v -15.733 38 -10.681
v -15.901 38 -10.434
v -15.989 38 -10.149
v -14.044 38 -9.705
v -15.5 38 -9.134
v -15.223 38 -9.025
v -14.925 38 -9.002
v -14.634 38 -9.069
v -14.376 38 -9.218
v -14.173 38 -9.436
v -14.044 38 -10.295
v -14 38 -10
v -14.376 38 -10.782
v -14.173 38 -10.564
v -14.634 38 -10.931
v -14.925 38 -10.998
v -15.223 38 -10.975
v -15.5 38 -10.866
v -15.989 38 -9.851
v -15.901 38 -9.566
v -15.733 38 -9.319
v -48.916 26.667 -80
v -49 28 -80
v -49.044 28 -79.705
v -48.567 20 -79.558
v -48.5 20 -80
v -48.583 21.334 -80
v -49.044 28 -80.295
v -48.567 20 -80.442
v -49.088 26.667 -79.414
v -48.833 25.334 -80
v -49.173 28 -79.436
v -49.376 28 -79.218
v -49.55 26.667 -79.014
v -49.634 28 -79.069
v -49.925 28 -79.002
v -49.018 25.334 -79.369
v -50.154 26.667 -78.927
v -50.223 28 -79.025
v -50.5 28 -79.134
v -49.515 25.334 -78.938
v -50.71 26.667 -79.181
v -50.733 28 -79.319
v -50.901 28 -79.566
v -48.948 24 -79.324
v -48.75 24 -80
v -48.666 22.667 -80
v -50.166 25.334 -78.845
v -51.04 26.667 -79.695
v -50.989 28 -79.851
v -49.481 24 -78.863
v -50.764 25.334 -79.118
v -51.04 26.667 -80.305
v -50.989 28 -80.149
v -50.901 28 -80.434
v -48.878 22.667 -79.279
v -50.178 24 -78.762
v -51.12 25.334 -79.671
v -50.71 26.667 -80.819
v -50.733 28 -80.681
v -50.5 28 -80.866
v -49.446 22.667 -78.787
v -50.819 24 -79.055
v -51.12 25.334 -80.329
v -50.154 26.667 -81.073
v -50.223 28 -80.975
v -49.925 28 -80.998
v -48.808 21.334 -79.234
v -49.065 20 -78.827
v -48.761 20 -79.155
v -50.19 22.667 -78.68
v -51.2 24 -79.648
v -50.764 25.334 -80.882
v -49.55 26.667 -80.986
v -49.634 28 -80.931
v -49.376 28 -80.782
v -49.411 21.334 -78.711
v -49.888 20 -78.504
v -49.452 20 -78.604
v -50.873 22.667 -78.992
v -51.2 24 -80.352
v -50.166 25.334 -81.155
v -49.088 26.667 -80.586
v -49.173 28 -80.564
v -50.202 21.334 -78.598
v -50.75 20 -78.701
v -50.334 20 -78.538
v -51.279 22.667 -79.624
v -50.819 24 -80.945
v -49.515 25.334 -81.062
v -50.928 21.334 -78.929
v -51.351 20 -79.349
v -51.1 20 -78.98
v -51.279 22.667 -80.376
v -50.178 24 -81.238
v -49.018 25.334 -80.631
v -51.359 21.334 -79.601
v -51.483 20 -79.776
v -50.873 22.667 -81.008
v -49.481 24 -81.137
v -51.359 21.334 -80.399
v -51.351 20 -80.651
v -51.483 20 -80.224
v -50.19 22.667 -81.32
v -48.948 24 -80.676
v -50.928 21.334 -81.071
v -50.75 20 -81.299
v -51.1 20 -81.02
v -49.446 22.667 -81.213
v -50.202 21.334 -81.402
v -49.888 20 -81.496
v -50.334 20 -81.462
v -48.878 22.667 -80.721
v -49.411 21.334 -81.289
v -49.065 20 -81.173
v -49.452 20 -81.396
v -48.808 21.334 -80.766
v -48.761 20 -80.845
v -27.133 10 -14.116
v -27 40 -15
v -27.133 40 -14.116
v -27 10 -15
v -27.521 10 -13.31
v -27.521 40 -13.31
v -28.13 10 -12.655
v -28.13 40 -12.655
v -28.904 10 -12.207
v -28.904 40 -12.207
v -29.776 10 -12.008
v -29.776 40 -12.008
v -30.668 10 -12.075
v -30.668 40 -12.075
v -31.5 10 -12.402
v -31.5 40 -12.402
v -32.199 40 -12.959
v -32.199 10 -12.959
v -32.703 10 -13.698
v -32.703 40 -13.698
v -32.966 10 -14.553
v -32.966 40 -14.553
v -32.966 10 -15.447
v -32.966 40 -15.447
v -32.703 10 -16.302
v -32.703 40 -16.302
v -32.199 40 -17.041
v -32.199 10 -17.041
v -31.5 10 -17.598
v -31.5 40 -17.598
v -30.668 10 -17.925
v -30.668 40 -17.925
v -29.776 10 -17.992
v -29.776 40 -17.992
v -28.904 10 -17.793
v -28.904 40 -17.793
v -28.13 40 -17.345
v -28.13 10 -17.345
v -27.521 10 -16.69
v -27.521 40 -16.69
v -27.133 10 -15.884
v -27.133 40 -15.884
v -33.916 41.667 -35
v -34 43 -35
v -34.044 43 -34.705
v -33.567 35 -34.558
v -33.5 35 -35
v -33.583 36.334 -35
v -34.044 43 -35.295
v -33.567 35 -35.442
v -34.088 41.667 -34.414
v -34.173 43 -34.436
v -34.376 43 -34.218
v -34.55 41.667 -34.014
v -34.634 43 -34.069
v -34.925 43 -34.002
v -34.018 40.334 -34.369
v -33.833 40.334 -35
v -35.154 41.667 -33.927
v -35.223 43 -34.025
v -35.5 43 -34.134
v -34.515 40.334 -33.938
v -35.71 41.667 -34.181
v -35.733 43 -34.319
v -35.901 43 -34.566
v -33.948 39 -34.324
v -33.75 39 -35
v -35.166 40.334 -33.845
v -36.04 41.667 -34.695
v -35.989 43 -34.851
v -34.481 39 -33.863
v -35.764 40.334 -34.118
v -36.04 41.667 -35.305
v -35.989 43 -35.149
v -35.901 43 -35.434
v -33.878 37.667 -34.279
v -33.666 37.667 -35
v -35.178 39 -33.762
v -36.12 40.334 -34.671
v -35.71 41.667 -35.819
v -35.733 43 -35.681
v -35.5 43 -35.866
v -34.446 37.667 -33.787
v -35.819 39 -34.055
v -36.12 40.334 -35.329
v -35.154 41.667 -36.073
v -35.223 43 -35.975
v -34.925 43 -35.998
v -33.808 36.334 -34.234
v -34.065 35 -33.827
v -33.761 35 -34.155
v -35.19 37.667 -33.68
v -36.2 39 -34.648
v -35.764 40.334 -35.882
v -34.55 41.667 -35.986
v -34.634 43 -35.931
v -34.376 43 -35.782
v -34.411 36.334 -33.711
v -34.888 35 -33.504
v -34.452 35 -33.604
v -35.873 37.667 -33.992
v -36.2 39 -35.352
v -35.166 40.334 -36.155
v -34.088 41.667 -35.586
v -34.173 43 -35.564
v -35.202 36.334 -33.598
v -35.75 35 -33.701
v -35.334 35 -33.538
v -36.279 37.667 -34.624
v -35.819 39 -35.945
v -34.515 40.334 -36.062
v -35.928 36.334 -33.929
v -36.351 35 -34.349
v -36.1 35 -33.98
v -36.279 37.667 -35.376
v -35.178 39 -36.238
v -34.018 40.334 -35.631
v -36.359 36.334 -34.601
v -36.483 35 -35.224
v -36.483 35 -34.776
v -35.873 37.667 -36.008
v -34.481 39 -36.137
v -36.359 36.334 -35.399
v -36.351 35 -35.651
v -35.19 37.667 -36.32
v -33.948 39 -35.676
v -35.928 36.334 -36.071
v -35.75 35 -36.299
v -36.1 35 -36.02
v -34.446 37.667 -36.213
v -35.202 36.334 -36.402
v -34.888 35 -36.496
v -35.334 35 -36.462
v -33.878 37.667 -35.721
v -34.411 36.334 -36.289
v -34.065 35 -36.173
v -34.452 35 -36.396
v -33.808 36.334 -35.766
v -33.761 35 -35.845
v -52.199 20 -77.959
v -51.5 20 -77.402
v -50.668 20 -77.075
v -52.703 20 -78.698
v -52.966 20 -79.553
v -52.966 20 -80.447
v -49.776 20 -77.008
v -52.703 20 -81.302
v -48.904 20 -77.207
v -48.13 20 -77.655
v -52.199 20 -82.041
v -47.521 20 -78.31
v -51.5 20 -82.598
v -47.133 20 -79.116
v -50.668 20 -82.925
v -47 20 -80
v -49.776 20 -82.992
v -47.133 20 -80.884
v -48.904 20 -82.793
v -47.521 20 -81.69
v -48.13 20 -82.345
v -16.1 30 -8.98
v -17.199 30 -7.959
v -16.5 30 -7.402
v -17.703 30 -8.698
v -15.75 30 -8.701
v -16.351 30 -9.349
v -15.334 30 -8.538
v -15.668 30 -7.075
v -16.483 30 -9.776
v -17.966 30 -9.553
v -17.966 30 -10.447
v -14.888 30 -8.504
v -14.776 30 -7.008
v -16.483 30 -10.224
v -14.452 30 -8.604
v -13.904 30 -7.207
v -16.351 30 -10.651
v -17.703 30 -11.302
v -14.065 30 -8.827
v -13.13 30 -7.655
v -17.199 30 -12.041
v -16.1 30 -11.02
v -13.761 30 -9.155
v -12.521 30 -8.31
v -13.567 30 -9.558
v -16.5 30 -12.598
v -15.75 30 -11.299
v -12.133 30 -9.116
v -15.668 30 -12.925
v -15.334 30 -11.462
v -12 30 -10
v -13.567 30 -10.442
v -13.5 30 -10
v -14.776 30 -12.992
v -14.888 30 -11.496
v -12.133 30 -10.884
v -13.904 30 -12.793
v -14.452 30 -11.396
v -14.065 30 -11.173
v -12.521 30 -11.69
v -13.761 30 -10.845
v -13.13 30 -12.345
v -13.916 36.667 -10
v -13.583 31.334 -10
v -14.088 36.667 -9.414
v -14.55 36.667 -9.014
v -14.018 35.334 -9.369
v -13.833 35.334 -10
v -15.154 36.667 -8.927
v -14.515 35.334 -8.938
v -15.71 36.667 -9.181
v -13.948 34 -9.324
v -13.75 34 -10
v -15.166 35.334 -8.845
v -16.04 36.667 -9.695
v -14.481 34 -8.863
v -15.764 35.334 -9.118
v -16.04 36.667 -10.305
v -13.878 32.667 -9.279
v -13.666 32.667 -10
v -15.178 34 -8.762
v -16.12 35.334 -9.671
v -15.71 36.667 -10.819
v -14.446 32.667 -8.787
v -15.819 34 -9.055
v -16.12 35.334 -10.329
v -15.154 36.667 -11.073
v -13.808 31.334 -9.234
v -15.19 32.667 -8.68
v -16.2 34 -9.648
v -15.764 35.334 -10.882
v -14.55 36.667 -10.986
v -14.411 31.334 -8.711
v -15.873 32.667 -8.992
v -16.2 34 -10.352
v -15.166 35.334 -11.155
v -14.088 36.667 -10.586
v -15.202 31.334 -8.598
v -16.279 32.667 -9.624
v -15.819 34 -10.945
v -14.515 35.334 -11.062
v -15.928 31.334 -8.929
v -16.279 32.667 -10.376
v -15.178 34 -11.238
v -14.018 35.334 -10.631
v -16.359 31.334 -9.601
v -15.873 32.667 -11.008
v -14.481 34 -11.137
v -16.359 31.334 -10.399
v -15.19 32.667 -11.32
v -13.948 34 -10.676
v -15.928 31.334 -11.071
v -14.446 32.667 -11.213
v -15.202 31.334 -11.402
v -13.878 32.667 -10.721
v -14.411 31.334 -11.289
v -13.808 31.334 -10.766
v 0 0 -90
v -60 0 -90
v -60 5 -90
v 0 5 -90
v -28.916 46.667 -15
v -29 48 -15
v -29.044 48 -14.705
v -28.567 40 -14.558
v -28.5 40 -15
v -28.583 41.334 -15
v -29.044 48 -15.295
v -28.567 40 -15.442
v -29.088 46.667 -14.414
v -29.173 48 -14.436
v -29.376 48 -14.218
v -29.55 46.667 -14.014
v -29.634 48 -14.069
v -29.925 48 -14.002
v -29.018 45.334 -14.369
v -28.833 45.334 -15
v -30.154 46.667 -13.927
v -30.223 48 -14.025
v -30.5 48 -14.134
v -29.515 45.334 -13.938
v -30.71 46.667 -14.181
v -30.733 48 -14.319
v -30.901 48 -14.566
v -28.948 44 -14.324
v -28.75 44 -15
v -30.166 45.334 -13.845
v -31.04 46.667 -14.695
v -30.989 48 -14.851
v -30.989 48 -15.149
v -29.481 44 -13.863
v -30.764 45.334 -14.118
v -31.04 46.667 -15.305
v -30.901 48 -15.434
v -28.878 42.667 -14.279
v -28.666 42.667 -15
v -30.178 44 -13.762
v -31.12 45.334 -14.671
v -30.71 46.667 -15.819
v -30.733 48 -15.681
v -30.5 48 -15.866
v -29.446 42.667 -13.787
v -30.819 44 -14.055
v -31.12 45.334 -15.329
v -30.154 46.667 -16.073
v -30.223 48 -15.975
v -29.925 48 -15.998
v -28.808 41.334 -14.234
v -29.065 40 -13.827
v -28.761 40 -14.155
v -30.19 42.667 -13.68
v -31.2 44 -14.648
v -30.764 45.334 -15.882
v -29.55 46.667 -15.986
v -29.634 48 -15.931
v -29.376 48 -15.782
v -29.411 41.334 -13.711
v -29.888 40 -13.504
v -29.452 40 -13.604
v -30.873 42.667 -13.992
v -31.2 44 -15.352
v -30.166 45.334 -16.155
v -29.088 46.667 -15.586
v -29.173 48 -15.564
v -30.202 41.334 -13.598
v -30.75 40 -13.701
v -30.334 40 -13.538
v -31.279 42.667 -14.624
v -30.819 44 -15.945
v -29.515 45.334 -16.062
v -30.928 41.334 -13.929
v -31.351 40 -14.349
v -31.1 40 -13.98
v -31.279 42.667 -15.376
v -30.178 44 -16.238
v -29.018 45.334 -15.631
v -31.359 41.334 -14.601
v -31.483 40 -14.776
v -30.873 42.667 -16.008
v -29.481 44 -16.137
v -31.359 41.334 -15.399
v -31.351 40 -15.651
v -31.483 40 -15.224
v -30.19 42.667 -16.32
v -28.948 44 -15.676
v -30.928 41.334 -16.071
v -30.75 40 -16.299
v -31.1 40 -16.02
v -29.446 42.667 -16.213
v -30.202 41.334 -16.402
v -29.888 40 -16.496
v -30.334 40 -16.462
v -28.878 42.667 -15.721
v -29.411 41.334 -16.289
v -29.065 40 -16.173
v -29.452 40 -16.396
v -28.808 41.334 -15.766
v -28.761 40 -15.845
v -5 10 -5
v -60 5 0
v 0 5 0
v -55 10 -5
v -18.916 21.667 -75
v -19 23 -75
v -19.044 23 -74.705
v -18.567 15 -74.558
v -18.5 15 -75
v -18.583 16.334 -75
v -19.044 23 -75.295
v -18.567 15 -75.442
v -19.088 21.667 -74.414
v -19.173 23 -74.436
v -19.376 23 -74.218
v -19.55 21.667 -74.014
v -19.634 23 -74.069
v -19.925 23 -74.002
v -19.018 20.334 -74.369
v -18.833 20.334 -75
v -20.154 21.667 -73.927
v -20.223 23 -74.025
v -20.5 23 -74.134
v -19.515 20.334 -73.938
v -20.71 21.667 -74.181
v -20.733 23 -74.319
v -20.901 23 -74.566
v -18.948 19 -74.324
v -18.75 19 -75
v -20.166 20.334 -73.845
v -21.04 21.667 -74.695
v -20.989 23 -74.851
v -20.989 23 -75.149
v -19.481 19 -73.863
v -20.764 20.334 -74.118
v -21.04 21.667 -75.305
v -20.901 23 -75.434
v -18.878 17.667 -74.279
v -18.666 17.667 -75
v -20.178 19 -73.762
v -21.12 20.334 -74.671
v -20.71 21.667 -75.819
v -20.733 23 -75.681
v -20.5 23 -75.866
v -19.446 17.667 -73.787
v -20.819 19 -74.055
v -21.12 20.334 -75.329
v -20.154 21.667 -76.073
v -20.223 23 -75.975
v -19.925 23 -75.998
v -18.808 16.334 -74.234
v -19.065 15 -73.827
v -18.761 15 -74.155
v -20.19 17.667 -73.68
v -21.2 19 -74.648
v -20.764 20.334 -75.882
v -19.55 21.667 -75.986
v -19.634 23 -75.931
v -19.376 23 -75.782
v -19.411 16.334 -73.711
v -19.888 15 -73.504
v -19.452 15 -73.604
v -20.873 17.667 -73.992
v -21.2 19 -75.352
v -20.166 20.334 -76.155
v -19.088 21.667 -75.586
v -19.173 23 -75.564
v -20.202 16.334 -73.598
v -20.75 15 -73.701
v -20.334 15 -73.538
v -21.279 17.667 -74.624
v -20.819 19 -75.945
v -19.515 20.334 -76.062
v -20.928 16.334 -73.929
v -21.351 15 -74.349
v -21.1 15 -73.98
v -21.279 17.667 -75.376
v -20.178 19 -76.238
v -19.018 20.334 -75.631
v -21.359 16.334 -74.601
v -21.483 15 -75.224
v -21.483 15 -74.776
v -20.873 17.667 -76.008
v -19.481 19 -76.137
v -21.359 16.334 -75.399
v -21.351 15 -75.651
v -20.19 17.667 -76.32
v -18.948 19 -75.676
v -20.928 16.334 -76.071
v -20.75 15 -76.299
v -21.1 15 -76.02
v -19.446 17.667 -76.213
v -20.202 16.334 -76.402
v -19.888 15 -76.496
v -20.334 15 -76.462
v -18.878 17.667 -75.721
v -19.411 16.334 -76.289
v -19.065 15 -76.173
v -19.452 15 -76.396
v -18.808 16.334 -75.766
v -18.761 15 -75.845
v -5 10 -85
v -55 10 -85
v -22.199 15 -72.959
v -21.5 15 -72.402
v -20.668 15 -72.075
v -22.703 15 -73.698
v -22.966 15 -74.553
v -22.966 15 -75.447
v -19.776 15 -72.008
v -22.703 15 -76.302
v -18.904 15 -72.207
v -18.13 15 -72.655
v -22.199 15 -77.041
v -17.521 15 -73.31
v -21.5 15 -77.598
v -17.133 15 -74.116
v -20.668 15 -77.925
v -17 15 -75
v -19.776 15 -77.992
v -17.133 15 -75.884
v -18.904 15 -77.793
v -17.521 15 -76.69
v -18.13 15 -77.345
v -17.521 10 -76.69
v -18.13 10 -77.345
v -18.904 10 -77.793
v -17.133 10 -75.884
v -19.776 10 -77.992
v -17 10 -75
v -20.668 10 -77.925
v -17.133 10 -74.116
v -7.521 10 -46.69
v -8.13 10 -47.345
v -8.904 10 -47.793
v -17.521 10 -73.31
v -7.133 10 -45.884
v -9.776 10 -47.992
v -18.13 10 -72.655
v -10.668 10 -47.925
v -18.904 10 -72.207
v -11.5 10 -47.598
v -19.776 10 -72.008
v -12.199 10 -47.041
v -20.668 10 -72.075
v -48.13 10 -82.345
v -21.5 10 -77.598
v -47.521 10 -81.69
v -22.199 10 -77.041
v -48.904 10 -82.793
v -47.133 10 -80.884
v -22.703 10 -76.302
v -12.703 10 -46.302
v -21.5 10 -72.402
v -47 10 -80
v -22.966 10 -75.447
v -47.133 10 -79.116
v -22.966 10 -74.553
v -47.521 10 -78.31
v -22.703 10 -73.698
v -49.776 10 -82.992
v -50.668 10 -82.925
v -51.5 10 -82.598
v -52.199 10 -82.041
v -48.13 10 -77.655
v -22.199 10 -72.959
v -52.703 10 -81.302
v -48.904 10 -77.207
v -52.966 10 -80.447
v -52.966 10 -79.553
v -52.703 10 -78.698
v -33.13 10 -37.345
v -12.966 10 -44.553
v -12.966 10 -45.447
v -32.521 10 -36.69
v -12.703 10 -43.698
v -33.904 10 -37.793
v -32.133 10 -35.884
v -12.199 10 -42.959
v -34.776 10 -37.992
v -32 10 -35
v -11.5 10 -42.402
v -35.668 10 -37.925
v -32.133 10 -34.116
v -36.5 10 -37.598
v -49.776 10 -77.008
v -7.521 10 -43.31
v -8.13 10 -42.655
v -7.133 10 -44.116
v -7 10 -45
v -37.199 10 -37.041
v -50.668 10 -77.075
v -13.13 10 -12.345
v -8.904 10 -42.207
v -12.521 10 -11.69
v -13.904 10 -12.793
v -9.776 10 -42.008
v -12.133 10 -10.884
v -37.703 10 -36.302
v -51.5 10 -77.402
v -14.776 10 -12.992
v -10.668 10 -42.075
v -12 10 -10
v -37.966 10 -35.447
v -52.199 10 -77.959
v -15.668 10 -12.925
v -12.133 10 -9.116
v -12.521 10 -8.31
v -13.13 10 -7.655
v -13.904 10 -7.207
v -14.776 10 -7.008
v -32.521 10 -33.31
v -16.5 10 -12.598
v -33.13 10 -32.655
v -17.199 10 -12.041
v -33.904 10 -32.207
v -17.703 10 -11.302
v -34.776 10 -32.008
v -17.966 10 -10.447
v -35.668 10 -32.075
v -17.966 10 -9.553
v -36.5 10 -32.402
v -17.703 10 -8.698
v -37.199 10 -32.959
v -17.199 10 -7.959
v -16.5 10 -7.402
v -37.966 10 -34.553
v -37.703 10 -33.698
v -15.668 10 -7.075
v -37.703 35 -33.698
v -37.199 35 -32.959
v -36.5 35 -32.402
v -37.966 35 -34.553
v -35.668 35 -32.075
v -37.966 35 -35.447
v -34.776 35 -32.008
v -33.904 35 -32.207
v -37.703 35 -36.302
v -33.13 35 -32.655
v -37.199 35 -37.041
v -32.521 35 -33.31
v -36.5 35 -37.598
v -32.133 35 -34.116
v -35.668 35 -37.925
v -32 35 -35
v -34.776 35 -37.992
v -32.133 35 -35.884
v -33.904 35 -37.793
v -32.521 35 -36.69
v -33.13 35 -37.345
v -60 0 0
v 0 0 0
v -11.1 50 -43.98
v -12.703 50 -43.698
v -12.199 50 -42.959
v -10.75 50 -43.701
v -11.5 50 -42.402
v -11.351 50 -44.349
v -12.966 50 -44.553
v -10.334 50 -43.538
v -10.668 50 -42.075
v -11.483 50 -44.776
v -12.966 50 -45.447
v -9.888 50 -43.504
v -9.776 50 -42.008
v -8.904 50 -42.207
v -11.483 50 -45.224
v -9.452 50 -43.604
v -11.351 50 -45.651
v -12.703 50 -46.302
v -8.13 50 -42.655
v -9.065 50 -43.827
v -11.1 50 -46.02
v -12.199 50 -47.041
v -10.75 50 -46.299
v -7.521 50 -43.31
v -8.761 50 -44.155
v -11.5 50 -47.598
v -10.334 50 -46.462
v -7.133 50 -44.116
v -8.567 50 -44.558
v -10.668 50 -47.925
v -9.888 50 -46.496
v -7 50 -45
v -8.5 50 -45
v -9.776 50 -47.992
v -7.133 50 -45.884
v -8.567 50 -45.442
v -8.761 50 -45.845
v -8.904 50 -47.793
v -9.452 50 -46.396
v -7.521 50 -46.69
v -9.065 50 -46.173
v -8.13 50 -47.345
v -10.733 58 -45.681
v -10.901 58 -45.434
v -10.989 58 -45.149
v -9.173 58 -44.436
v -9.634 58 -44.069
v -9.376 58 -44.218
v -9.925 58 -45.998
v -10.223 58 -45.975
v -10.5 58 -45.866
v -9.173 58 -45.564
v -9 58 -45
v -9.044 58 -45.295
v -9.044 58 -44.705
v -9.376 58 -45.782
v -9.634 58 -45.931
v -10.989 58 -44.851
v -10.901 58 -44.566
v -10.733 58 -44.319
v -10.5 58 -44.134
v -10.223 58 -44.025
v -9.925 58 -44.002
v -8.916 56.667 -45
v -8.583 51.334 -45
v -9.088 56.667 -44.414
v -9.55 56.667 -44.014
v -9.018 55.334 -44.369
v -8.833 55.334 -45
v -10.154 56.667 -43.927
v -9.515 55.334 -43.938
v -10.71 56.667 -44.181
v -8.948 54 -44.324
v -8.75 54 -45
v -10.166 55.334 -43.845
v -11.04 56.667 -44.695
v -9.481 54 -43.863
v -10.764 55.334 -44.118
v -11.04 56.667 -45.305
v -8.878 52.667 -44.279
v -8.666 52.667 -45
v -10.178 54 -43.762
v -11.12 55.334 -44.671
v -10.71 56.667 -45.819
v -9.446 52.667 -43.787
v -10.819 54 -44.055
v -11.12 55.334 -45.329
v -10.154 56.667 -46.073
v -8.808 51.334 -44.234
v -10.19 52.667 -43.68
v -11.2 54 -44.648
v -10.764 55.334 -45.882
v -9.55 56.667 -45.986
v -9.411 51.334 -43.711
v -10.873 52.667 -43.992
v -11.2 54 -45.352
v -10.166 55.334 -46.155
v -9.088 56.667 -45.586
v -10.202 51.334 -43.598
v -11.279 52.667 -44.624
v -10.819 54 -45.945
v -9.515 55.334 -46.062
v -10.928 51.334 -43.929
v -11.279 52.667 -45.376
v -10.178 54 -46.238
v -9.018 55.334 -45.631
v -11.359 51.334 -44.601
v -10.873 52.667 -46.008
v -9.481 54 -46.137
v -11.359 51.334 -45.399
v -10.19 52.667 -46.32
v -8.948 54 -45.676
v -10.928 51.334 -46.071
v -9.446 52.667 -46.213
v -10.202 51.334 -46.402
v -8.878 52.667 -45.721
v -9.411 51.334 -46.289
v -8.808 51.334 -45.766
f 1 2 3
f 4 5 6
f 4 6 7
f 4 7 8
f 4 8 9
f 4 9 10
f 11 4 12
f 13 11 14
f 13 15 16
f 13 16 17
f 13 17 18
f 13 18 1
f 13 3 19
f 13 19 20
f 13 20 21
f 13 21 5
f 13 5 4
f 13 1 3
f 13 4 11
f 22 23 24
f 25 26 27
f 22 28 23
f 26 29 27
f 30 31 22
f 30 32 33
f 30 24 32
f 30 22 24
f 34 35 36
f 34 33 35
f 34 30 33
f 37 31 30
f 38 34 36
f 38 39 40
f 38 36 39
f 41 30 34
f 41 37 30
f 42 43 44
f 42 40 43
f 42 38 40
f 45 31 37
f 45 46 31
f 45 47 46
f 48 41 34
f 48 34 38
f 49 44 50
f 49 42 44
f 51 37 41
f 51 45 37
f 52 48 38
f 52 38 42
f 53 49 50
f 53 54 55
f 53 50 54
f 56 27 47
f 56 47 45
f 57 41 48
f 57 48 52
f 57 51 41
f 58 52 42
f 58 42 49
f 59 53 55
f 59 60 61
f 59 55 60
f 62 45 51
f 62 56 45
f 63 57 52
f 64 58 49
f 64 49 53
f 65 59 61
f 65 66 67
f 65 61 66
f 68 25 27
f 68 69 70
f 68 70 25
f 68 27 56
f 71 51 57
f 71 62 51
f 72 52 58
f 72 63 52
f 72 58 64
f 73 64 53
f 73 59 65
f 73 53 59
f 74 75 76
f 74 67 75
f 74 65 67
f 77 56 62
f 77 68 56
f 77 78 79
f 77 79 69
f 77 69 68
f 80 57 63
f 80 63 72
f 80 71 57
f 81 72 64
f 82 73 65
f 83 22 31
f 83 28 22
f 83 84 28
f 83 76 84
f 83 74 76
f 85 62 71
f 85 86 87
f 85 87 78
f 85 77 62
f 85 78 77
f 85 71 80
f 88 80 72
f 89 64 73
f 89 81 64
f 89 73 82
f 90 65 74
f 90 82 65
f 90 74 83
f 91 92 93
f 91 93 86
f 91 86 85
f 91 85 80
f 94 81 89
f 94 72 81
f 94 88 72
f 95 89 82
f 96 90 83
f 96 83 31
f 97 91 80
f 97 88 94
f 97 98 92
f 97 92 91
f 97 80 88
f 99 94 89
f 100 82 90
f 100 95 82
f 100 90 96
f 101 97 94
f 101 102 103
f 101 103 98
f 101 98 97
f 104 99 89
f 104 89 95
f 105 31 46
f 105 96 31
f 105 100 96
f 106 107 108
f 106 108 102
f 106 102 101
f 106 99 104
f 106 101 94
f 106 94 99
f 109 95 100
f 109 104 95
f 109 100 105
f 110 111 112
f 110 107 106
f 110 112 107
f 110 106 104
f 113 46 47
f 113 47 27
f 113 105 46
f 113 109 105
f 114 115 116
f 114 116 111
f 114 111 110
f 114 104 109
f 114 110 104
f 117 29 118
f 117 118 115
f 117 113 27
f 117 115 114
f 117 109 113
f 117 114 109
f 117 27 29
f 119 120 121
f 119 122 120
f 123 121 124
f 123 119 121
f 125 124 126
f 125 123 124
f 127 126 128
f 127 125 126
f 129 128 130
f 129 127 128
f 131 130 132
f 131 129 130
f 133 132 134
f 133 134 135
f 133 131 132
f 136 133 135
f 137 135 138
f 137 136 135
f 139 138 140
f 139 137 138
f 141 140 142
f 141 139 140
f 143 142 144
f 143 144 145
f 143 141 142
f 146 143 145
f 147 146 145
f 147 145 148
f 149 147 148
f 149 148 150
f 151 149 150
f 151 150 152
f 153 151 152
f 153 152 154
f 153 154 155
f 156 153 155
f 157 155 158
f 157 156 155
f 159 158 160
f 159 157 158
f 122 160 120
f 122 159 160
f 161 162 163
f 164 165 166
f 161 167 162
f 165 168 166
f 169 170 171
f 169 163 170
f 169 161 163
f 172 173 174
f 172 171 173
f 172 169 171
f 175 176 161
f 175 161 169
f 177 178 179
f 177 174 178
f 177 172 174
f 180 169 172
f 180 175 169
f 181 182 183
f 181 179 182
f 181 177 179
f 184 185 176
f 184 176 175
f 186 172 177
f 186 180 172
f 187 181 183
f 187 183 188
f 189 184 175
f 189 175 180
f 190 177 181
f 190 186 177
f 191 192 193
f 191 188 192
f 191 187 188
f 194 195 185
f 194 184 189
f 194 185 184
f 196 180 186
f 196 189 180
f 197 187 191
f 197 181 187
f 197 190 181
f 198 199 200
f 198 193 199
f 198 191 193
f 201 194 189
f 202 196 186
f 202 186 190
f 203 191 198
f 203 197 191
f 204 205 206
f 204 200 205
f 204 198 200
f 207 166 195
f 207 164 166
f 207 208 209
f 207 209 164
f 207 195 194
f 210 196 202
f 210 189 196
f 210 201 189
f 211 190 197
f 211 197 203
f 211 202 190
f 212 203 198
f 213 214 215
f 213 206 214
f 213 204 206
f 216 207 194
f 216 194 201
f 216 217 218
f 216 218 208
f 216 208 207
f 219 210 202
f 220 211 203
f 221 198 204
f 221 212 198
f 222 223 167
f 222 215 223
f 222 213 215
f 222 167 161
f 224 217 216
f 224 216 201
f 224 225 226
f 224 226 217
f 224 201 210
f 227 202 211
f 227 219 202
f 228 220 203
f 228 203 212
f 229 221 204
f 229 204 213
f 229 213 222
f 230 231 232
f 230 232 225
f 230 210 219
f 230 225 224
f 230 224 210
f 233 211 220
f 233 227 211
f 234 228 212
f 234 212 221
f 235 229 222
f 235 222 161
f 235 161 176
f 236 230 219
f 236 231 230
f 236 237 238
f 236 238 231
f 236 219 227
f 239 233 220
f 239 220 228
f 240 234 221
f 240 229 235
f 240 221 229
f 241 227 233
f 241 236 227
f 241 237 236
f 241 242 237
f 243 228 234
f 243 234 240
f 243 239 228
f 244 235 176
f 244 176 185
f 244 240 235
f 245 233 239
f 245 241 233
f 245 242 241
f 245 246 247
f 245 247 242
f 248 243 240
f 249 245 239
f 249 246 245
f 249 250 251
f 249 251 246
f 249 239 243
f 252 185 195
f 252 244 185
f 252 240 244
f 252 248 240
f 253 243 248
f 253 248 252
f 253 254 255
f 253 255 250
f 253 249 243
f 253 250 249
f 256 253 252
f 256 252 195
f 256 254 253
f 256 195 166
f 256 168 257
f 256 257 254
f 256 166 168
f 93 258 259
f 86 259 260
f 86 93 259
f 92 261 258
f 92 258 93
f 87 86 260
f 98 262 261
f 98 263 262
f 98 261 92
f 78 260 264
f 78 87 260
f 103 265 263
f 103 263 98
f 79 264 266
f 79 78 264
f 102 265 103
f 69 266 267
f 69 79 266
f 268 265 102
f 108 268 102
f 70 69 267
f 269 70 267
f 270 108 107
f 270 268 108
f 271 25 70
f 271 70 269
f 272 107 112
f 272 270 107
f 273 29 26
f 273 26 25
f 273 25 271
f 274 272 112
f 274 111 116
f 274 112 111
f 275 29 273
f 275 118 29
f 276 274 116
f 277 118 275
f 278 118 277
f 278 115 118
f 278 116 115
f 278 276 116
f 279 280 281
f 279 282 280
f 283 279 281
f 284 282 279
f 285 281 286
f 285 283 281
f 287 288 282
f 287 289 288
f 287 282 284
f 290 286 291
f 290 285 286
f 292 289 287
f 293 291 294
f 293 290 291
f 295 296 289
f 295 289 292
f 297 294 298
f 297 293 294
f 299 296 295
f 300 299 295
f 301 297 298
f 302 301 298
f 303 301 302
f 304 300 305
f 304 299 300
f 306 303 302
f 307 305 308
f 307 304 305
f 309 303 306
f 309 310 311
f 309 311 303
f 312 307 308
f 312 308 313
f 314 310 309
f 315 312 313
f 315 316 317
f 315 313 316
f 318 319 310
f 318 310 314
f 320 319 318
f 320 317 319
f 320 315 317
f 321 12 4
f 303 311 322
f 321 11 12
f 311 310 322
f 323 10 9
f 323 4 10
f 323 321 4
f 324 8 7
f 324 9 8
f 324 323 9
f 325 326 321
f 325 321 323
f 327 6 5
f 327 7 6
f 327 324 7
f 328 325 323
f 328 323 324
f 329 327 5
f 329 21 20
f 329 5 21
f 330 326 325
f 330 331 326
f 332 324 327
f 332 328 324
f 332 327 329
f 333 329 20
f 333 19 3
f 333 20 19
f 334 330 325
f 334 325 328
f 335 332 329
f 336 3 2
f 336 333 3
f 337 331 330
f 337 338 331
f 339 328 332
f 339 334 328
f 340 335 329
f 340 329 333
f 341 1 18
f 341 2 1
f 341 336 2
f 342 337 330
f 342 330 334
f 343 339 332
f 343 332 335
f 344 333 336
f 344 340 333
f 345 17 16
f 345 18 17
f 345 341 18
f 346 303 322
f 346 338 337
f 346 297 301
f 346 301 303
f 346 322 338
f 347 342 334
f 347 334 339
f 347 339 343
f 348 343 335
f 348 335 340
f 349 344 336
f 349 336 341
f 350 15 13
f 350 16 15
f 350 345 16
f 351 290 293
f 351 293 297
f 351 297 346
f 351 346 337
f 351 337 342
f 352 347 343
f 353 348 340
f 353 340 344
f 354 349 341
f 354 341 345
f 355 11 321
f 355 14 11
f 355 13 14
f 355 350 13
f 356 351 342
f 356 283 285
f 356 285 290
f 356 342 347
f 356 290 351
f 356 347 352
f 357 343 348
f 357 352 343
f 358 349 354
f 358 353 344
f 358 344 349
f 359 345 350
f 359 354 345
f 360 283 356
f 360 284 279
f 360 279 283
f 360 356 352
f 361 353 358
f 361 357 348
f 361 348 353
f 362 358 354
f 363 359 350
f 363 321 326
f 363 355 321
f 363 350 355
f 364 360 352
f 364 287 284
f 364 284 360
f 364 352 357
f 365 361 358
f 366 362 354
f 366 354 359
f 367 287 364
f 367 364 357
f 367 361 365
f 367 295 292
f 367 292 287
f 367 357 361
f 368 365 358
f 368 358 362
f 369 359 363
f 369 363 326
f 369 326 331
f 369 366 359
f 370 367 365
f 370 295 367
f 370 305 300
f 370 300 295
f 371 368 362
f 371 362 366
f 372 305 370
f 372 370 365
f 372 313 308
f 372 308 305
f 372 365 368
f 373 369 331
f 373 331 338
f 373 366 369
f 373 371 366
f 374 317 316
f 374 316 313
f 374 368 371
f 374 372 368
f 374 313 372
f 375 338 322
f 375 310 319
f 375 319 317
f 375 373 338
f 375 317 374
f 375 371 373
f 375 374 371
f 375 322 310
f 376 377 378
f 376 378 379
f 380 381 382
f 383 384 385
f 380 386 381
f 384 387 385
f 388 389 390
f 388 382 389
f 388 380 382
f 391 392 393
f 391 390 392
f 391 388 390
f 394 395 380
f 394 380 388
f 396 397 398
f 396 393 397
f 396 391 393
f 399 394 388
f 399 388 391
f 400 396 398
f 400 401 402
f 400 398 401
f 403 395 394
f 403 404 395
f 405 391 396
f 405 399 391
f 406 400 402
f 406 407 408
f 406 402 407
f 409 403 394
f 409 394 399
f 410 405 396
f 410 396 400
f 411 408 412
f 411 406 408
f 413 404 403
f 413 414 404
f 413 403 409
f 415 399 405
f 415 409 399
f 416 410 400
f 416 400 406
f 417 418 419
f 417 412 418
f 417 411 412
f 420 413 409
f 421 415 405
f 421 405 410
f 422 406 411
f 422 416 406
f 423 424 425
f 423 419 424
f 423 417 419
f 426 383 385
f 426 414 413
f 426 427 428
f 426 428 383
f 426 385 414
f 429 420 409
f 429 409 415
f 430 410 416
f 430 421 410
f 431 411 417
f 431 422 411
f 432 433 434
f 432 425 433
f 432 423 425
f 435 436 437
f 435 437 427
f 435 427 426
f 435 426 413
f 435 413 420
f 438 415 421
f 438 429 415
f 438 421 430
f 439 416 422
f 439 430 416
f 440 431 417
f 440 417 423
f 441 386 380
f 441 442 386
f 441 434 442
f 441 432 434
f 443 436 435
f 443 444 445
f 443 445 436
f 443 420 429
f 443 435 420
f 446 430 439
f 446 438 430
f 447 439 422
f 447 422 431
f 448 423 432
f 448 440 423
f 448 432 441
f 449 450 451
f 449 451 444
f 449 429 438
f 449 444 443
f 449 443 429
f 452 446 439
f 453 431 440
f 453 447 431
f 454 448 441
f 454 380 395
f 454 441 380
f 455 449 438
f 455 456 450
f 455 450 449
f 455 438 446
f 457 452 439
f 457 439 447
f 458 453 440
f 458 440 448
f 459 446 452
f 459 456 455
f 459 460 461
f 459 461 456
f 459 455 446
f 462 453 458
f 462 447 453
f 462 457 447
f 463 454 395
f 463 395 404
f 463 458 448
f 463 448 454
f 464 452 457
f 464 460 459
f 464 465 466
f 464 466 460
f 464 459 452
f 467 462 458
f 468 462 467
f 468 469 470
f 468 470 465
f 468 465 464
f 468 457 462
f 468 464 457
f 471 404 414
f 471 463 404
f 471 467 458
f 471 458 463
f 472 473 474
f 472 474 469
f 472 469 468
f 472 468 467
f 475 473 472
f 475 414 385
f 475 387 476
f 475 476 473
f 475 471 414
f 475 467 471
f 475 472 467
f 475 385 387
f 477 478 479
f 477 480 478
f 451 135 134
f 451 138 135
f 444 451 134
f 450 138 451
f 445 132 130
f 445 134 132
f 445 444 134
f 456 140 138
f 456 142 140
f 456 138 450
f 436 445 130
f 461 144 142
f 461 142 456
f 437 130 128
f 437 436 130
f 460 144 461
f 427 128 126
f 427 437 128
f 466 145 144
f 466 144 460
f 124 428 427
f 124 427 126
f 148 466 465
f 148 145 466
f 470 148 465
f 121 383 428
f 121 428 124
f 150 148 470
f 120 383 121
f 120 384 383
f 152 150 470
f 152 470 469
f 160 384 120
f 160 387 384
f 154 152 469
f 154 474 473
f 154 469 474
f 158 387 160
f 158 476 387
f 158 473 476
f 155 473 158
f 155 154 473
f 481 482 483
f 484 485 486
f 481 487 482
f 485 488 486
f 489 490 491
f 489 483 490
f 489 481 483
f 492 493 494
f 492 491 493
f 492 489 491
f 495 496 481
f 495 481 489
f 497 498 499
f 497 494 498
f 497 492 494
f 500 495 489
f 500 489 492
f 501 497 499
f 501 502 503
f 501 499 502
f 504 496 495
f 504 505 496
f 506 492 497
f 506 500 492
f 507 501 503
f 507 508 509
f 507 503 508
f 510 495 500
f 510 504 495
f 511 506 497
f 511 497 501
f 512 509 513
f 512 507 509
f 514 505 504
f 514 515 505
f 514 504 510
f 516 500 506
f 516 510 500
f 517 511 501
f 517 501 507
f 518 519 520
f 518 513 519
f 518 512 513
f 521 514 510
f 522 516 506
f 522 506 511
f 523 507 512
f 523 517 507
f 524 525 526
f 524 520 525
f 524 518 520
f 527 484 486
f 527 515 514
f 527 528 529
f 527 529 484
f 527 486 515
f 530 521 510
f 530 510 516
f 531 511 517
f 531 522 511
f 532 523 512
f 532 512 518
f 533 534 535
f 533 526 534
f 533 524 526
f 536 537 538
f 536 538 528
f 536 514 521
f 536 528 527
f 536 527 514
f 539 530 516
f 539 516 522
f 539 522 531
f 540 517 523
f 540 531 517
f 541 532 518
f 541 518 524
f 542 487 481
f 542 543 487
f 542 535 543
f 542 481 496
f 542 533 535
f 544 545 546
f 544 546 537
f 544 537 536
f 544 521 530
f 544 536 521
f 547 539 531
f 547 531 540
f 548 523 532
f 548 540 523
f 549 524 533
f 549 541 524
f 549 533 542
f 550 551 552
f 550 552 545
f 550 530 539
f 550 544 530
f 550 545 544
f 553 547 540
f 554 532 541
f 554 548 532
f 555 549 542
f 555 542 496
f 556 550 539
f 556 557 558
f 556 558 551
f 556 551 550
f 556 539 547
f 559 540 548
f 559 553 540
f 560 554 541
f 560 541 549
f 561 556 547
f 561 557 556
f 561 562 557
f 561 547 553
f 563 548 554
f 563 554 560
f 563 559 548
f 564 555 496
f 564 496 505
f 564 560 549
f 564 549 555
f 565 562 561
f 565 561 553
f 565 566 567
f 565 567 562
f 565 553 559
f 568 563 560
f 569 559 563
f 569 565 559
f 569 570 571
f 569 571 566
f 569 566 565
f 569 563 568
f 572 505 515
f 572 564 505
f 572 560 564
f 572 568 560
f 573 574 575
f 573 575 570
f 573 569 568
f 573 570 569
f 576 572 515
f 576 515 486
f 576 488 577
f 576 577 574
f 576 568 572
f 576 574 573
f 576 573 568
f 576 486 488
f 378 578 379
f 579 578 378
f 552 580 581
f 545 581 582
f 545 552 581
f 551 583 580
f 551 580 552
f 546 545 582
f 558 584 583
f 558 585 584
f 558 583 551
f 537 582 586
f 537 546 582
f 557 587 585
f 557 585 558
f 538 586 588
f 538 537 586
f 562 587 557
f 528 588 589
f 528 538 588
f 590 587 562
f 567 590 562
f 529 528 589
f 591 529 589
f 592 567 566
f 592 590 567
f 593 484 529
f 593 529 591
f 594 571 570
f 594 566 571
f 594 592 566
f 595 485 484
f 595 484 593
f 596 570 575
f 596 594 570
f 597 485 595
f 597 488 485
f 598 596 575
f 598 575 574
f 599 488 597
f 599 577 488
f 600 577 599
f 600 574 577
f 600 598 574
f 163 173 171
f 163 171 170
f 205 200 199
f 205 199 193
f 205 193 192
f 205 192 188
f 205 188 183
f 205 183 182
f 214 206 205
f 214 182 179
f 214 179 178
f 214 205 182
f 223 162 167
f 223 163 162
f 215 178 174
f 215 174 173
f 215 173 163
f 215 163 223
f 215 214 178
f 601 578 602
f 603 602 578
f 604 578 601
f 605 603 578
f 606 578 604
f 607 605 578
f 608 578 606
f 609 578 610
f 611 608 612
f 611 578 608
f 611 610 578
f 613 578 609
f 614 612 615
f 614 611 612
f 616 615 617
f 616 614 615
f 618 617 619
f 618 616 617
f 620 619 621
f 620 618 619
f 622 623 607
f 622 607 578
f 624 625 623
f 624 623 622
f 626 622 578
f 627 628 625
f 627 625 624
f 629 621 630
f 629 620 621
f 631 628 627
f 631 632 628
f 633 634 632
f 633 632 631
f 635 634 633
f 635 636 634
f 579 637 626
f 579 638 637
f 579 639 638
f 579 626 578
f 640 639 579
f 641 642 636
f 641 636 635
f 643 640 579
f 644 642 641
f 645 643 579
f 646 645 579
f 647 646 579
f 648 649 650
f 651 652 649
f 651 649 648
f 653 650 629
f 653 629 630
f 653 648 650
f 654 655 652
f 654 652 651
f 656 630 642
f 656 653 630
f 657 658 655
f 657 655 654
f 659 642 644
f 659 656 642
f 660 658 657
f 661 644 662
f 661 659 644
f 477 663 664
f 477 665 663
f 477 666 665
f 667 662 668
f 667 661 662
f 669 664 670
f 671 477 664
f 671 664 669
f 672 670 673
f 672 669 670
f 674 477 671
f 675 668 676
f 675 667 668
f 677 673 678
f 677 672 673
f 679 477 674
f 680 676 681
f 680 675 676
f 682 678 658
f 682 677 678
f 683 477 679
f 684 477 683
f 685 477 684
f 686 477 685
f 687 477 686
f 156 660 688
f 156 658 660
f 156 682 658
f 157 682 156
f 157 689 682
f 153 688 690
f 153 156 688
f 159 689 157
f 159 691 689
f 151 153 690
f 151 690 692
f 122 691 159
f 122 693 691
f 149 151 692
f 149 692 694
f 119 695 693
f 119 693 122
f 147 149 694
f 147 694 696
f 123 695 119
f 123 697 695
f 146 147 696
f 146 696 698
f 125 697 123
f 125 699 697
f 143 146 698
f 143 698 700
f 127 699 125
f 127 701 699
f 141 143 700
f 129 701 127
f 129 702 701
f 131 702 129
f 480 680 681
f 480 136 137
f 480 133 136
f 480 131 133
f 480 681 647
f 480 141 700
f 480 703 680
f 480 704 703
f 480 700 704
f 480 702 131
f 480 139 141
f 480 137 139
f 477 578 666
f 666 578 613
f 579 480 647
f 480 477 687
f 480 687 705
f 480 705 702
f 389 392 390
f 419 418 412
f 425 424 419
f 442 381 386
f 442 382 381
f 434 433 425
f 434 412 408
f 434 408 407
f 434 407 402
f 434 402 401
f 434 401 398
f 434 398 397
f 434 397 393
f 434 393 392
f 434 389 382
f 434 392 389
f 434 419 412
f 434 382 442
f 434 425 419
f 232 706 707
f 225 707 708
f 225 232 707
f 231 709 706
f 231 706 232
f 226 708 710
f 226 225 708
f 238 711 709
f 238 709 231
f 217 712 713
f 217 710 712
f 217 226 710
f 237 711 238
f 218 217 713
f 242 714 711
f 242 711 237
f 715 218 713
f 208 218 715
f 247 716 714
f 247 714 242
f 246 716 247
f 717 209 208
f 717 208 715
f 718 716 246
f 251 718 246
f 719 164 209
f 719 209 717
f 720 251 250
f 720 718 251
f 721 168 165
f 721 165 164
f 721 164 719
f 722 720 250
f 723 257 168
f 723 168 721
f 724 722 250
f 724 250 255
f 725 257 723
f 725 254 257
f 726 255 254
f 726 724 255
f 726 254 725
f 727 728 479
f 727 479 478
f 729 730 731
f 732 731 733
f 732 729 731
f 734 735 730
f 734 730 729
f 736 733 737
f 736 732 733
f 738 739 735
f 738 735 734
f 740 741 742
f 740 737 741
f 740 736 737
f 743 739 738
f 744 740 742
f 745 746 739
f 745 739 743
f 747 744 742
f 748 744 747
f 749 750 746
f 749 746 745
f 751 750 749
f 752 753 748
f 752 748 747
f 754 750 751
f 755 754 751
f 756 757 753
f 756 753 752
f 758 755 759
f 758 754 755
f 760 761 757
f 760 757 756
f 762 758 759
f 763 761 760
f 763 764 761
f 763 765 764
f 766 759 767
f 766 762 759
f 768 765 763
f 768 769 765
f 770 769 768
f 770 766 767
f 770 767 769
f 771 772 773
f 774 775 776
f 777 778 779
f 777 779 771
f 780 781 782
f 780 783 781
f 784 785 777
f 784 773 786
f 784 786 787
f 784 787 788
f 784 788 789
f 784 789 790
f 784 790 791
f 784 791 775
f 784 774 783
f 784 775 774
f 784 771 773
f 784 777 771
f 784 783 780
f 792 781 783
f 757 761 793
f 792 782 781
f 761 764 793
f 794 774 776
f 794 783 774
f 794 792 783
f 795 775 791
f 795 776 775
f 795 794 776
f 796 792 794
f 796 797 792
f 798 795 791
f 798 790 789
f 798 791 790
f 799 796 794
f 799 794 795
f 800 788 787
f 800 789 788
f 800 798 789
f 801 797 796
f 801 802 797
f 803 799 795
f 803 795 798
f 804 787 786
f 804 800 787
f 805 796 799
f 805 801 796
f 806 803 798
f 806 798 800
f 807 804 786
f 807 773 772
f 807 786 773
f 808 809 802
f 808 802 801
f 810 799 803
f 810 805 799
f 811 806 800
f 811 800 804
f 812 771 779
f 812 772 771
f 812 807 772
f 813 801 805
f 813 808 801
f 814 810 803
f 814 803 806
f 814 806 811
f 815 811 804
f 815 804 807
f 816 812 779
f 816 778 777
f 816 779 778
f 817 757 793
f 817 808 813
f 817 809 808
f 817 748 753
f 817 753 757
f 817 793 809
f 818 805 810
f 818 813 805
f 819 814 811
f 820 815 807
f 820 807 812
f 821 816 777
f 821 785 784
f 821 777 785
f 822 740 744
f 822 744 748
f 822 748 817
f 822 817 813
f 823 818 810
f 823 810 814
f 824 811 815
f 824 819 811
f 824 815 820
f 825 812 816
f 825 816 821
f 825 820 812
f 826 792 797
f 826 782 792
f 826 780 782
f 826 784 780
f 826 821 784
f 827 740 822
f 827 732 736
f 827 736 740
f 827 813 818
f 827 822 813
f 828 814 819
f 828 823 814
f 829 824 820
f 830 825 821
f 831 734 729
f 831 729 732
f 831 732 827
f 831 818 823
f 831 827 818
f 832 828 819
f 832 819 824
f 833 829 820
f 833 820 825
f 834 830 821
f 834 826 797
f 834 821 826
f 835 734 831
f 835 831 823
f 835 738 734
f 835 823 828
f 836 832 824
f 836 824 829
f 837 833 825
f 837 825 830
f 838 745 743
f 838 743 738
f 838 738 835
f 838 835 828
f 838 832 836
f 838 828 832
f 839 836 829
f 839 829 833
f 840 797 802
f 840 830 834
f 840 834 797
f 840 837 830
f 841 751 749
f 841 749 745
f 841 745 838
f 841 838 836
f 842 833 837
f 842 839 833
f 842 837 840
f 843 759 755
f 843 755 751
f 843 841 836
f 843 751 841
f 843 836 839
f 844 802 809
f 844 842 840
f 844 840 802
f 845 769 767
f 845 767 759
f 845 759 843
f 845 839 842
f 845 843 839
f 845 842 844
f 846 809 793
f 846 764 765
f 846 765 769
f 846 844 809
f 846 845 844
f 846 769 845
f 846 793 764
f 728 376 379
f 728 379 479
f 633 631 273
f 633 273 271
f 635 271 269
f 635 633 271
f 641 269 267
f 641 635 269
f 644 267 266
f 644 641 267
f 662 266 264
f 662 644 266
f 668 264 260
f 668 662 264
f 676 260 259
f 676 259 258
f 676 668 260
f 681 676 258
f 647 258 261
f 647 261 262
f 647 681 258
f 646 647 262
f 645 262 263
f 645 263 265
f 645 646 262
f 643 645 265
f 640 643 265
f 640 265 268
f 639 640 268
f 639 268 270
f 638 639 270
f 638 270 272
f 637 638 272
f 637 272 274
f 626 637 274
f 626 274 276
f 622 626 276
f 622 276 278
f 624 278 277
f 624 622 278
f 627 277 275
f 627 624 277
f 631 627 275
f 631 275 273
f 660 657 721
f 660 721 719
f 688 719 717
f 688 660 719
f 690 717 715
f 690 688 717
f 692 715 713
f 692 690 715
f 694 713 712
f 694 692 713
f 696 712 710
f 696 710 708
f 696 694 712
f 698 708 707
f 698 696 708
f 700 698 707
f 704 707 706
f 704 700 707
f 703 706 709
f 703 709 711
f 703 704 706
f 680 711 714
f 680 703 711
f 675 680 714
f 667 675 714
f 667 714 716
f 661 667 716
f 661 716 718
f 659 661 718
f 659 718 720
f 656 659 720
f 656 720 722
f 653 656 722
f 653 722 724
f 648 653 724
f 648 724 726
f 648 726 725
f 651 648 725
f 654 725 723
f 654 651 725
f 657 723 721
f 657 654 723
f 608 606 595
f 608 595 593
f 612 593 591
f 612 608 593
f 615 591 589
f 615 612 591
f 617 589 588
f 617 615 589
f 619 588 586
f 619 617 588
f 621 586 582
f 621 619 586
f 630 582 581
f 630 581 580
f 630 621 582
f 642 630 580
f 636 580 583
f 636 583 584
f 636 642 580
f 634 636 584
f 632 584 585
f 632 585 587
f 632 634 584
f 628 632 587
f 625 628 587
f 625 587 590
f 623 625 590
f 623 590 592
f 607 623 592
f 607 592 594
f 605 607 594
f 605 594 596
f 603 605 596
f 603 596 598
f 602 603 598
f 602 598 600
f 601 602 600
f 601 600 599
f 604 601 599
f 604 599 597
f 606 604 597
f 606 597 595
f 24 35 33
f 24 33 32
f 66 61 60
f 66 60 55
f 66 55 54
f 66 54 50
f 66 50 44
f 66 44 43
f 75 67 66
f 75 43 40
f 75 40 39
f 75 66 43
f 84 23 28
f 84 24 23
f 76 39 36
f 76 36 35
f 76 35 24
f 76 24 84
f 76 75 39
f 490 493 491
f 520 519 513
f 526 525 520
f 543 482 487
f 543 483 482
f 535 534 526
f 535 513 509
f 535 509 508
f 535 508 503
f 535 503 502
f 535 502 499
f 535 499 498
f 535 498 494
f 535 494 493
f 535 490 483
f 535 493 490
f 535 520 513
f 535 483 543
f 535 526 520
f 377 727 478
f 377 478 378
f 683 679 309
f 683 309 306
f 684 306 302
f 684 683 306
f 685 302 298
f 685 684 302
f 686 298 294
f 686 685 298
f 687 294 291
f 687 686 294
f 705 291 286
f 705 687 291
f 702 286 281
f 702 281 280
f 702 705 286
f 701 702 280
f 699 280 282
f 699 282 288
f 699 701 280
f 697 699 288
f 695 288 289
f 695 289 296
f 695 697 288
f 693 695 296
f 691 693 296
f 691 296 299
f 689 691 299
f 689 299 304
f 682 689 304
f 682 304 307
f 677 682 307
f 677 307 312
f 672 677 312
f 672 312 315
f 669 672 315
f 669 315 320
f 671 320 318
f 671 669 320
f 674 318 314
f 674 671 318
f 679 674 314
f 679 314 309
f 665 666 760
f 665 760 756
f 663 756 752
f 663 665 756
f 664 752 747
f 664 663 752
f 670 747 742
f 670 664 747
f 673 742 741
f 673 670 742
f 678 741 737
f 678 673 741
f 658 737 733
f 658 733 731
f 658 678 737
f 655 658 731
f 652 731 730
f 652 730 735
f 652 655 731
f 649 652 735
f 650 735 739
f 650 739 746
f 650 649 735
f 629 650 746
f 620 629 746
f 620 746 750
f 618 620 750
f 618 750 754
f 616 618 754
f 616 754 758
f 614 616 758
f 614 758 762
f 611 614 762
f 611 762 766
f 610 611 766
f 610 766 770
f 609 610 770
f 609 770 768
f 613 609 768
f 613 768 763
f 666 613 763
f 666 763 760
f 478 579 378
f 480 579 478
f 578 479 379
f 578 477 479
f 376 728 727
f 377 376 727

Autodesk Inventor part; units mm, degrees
ref_plane "YZ Plane" through (0, 0, 0) normal (1, 0, 0) x (0, 1, 0)
ref_plane "XZ Plane" through (0, 0, 0) normal (0, 1, 0) x (-1, 0, 0)
ref_plane "XY Plane" through (0, 0, 0) normal (0, 0, 1) x (1, 0, 0)
sketch "草圖1" plane through (0, 0, 0) normal (0, 1, 0) x (-1, 0, 0)
  line L0 (0, 0) -> (60, 0)
  line L1 (60, 0) -> (60, -90)
  line L2 (60, -90) -> (0, -90)
  line L3 (0, -90) -> (0, 0)
  dimension "d0" = 60
  dimension "d1" = 90
extrude "擠出1" add sketch "草圖1" along normal blind 10
chamfer "倒角1" distance 5 angle 45 4 edges at (-60, 10, -45) (-30, 10, 0) (0, 10, -45) (-30, 10, -90)
sketch "草圖2" plane through (0, 10, 0) normal (0, 1, 0) x (1, 0, 0)
  line L0 (-60, 0) -> (0, 0) projected
  line L1 (0, 0) -> (-15, 0)
  line L2 (-15, 0) -> (-15, 10)
  line L3 (-15, 10) -> (0, 10)
  line L4 (0, 10) -> (0, 0)
  line L5 (-15, 10) -> (-30, 10)
  line L6 (-30, 10) -> (-30, 15)
  line L7 (-30, 15) -> (-15, 15)
  line L8 (-15, 15) -> (-15, 10)
  line L9 (-30, 15) -> (-35, 15)
  line L10 (-35, 15) -> (-35, 35)
  line L11 (-35, 35) -> (-30, 35)
  line L12 (-30, 35) -> (-30, 15)
  line L13 (-35, 35) -> (-50, 35)
  line L14 (-50, 35) -> (-50, 80)
  line L15 (-50, 80) -> (-35, 80)
  line L16 (-35, 80) -> (-35, 35)
  line L17 (-35, 80) -> (-20, 80)
  line L18 (-20, 80) -> (-20, 75)
  line L19 (-20, 75) -> (-35, 75)
  line L20 (-35, 75) -> (-35, 80)
  line L21 (-20, 75) -> (-10, 75)
  line L22 (-10, 75) -> (-10, 45)
  line L23 (-10, 45) -> (-20, 45)
  line L24 (-20, 45) -> (-20, 75)
  circle A0 centre (-15, 10) radius 3
  circle A1 centre (-30, 15) radius 3
  circle A2 centre (-35, 35) radius 3
  circle A3 centre (-50, 80) radius 3
  circle A4 centre (-20, 75) radius 3
  circle A5 centre (-10, 45) radius 3
  dimension "d7" = 15
  dimension "d8" = 10
  dimension "d9" = 15
  dimension "d10" = 5
  dimension "d11" = 5
  dimension "d12" = 20
  dimension "d13" = 15
  dimension "d14" = 45
  dimension "d15" = 15
  dimension "d16" = 5
  dimension "d17" = 10
  dimension "d18" = 30
  dimension "d19" = 6
  dimension "d20" = 6
  dimension "d21" = 6
  dimension "d22" = 6
  dimension "d23" = 6
  dimension "d24" = 6
extrude "擠出2" add sketch "草圖2" along normal blind 40 contours A5 L22 L23 | L23 L22 A5
extrude "擠出3" add sketch "草圖2" along normal blind 5 contours A4 L18 L19 | L19 L24 A4 | L18 A4 L21 | L21 A4 L24
extrude "擠出4" add sketch "草圖2" along normal blind 10 contours A3 L15 L14 | L14 L15 A3
extrude "擠出5" add sketch "草圖2" along normal blind 25 contours A2 L13 L10 | L10 L11 A2 | L11 L16 A2 | L13 A2 L16
extrude "擠出6" add sketch "草圖2" along normal blind 20 contours A0 L5 L2 | L2 L3 A0 | L8 A0 L3 | L5 A0 L8
extrude "擠出7" add sketch "草圖2" along normal blind 30 contours A1 L9 L6 | L6 L7 A1 | L7 L12 A1 | L9 A1 L12
sketch "草圖3" plane through (-15, 30, -10) normal (0, 1, 0) x (1, 0, 0)
  circle A0 centre (0, 0) radius 1.5
  point P0 (15, -10)
  dimension "d37" = 3
sketch "草圖4" plane through (-30, 40, -15) normal (0, 1, 0) x (1, 0, 0)
  circle A0 centre (0, 0) radius 1.5
  point P0 (30, -15)
  dimension "d38" = 3
sketch "草圖5" plane through (-10, 50, -45) normal (0, 1, 0) x (1, 0, 0)
  circle A0 centre (0, 0) radius 1.5
  point P0 (10, -45)
  dimension "d39" = 3
sketch "草圖6" plane through (-35, 35, -35) normal (0, 1, 0) x (1, 0, 0)
  circle A0 centre (0, 0) radius 1.5
  point P0 (35, -35)
  dimension "d40" = 3
sketch "草圖7" plane through (-50, 20, -80) normal (0, 1, 0) x (1, 0, 0)
  circle A0 centre (0, 0) radius 1.5
  point P0 (50, -80)
  dimension "d41" = 3
sketch "草圖8" plane through (-20, 15, -75) normal (0, 1, 0) x (1, 0, 0)
  circle A0 centre (0, 0) radius 1.5
  point P0 (20, -75)
  dimension "d42" = 3
extrude "擠出8" add sketch "草圖8" along normal blind 8
extrude "擠出9" add sketch "草圖5" along normal blind 8
extrude "擠出10" add sketch "草圖3" along normal blind 8
extrude "擠出11" add sketch "草圖4" along normal blind 8
extrude "擠出12" add sketch "草圖6" along normal blind 8
extrude "擠出13" add sketch "草圖7" along normal blind 8
chamfer "倒角2" distance 0.5 distance2 8 1 edges at (-51.5, 28, -80) measured on face at (-50.167, 28, -80.5524)
chamfer "倒角3" distance 0.5 distance2 8 1 edges at (-21.5, 23, -75) measured on face at (-20.167, 23, -75.5524)
chamfer "倒角4" distance 0.5 distance2 8 1 edges at (-11.5, 58, -45) measured on face at (-9.1644, 58, -45.3876)
chamfer "倒角5" distance 0.5 distance2 8 1 edges at (-36.5, 43, -35) measured on face at (-34.1644, 43, -35.3876)
chamfer "倒角6" distance 0.5 distance2 8 1 edges at (-31.5, 48, -15) measured on face at (-29.1644, 48, -15.3876)
chamfer "倒角7" distance 0.5 distance2 8 1 edges at (-16.5, 38, -10) measured on face at (-14.6048, 38, -9.3766)
properties part number "HeadTrackerProMax"
